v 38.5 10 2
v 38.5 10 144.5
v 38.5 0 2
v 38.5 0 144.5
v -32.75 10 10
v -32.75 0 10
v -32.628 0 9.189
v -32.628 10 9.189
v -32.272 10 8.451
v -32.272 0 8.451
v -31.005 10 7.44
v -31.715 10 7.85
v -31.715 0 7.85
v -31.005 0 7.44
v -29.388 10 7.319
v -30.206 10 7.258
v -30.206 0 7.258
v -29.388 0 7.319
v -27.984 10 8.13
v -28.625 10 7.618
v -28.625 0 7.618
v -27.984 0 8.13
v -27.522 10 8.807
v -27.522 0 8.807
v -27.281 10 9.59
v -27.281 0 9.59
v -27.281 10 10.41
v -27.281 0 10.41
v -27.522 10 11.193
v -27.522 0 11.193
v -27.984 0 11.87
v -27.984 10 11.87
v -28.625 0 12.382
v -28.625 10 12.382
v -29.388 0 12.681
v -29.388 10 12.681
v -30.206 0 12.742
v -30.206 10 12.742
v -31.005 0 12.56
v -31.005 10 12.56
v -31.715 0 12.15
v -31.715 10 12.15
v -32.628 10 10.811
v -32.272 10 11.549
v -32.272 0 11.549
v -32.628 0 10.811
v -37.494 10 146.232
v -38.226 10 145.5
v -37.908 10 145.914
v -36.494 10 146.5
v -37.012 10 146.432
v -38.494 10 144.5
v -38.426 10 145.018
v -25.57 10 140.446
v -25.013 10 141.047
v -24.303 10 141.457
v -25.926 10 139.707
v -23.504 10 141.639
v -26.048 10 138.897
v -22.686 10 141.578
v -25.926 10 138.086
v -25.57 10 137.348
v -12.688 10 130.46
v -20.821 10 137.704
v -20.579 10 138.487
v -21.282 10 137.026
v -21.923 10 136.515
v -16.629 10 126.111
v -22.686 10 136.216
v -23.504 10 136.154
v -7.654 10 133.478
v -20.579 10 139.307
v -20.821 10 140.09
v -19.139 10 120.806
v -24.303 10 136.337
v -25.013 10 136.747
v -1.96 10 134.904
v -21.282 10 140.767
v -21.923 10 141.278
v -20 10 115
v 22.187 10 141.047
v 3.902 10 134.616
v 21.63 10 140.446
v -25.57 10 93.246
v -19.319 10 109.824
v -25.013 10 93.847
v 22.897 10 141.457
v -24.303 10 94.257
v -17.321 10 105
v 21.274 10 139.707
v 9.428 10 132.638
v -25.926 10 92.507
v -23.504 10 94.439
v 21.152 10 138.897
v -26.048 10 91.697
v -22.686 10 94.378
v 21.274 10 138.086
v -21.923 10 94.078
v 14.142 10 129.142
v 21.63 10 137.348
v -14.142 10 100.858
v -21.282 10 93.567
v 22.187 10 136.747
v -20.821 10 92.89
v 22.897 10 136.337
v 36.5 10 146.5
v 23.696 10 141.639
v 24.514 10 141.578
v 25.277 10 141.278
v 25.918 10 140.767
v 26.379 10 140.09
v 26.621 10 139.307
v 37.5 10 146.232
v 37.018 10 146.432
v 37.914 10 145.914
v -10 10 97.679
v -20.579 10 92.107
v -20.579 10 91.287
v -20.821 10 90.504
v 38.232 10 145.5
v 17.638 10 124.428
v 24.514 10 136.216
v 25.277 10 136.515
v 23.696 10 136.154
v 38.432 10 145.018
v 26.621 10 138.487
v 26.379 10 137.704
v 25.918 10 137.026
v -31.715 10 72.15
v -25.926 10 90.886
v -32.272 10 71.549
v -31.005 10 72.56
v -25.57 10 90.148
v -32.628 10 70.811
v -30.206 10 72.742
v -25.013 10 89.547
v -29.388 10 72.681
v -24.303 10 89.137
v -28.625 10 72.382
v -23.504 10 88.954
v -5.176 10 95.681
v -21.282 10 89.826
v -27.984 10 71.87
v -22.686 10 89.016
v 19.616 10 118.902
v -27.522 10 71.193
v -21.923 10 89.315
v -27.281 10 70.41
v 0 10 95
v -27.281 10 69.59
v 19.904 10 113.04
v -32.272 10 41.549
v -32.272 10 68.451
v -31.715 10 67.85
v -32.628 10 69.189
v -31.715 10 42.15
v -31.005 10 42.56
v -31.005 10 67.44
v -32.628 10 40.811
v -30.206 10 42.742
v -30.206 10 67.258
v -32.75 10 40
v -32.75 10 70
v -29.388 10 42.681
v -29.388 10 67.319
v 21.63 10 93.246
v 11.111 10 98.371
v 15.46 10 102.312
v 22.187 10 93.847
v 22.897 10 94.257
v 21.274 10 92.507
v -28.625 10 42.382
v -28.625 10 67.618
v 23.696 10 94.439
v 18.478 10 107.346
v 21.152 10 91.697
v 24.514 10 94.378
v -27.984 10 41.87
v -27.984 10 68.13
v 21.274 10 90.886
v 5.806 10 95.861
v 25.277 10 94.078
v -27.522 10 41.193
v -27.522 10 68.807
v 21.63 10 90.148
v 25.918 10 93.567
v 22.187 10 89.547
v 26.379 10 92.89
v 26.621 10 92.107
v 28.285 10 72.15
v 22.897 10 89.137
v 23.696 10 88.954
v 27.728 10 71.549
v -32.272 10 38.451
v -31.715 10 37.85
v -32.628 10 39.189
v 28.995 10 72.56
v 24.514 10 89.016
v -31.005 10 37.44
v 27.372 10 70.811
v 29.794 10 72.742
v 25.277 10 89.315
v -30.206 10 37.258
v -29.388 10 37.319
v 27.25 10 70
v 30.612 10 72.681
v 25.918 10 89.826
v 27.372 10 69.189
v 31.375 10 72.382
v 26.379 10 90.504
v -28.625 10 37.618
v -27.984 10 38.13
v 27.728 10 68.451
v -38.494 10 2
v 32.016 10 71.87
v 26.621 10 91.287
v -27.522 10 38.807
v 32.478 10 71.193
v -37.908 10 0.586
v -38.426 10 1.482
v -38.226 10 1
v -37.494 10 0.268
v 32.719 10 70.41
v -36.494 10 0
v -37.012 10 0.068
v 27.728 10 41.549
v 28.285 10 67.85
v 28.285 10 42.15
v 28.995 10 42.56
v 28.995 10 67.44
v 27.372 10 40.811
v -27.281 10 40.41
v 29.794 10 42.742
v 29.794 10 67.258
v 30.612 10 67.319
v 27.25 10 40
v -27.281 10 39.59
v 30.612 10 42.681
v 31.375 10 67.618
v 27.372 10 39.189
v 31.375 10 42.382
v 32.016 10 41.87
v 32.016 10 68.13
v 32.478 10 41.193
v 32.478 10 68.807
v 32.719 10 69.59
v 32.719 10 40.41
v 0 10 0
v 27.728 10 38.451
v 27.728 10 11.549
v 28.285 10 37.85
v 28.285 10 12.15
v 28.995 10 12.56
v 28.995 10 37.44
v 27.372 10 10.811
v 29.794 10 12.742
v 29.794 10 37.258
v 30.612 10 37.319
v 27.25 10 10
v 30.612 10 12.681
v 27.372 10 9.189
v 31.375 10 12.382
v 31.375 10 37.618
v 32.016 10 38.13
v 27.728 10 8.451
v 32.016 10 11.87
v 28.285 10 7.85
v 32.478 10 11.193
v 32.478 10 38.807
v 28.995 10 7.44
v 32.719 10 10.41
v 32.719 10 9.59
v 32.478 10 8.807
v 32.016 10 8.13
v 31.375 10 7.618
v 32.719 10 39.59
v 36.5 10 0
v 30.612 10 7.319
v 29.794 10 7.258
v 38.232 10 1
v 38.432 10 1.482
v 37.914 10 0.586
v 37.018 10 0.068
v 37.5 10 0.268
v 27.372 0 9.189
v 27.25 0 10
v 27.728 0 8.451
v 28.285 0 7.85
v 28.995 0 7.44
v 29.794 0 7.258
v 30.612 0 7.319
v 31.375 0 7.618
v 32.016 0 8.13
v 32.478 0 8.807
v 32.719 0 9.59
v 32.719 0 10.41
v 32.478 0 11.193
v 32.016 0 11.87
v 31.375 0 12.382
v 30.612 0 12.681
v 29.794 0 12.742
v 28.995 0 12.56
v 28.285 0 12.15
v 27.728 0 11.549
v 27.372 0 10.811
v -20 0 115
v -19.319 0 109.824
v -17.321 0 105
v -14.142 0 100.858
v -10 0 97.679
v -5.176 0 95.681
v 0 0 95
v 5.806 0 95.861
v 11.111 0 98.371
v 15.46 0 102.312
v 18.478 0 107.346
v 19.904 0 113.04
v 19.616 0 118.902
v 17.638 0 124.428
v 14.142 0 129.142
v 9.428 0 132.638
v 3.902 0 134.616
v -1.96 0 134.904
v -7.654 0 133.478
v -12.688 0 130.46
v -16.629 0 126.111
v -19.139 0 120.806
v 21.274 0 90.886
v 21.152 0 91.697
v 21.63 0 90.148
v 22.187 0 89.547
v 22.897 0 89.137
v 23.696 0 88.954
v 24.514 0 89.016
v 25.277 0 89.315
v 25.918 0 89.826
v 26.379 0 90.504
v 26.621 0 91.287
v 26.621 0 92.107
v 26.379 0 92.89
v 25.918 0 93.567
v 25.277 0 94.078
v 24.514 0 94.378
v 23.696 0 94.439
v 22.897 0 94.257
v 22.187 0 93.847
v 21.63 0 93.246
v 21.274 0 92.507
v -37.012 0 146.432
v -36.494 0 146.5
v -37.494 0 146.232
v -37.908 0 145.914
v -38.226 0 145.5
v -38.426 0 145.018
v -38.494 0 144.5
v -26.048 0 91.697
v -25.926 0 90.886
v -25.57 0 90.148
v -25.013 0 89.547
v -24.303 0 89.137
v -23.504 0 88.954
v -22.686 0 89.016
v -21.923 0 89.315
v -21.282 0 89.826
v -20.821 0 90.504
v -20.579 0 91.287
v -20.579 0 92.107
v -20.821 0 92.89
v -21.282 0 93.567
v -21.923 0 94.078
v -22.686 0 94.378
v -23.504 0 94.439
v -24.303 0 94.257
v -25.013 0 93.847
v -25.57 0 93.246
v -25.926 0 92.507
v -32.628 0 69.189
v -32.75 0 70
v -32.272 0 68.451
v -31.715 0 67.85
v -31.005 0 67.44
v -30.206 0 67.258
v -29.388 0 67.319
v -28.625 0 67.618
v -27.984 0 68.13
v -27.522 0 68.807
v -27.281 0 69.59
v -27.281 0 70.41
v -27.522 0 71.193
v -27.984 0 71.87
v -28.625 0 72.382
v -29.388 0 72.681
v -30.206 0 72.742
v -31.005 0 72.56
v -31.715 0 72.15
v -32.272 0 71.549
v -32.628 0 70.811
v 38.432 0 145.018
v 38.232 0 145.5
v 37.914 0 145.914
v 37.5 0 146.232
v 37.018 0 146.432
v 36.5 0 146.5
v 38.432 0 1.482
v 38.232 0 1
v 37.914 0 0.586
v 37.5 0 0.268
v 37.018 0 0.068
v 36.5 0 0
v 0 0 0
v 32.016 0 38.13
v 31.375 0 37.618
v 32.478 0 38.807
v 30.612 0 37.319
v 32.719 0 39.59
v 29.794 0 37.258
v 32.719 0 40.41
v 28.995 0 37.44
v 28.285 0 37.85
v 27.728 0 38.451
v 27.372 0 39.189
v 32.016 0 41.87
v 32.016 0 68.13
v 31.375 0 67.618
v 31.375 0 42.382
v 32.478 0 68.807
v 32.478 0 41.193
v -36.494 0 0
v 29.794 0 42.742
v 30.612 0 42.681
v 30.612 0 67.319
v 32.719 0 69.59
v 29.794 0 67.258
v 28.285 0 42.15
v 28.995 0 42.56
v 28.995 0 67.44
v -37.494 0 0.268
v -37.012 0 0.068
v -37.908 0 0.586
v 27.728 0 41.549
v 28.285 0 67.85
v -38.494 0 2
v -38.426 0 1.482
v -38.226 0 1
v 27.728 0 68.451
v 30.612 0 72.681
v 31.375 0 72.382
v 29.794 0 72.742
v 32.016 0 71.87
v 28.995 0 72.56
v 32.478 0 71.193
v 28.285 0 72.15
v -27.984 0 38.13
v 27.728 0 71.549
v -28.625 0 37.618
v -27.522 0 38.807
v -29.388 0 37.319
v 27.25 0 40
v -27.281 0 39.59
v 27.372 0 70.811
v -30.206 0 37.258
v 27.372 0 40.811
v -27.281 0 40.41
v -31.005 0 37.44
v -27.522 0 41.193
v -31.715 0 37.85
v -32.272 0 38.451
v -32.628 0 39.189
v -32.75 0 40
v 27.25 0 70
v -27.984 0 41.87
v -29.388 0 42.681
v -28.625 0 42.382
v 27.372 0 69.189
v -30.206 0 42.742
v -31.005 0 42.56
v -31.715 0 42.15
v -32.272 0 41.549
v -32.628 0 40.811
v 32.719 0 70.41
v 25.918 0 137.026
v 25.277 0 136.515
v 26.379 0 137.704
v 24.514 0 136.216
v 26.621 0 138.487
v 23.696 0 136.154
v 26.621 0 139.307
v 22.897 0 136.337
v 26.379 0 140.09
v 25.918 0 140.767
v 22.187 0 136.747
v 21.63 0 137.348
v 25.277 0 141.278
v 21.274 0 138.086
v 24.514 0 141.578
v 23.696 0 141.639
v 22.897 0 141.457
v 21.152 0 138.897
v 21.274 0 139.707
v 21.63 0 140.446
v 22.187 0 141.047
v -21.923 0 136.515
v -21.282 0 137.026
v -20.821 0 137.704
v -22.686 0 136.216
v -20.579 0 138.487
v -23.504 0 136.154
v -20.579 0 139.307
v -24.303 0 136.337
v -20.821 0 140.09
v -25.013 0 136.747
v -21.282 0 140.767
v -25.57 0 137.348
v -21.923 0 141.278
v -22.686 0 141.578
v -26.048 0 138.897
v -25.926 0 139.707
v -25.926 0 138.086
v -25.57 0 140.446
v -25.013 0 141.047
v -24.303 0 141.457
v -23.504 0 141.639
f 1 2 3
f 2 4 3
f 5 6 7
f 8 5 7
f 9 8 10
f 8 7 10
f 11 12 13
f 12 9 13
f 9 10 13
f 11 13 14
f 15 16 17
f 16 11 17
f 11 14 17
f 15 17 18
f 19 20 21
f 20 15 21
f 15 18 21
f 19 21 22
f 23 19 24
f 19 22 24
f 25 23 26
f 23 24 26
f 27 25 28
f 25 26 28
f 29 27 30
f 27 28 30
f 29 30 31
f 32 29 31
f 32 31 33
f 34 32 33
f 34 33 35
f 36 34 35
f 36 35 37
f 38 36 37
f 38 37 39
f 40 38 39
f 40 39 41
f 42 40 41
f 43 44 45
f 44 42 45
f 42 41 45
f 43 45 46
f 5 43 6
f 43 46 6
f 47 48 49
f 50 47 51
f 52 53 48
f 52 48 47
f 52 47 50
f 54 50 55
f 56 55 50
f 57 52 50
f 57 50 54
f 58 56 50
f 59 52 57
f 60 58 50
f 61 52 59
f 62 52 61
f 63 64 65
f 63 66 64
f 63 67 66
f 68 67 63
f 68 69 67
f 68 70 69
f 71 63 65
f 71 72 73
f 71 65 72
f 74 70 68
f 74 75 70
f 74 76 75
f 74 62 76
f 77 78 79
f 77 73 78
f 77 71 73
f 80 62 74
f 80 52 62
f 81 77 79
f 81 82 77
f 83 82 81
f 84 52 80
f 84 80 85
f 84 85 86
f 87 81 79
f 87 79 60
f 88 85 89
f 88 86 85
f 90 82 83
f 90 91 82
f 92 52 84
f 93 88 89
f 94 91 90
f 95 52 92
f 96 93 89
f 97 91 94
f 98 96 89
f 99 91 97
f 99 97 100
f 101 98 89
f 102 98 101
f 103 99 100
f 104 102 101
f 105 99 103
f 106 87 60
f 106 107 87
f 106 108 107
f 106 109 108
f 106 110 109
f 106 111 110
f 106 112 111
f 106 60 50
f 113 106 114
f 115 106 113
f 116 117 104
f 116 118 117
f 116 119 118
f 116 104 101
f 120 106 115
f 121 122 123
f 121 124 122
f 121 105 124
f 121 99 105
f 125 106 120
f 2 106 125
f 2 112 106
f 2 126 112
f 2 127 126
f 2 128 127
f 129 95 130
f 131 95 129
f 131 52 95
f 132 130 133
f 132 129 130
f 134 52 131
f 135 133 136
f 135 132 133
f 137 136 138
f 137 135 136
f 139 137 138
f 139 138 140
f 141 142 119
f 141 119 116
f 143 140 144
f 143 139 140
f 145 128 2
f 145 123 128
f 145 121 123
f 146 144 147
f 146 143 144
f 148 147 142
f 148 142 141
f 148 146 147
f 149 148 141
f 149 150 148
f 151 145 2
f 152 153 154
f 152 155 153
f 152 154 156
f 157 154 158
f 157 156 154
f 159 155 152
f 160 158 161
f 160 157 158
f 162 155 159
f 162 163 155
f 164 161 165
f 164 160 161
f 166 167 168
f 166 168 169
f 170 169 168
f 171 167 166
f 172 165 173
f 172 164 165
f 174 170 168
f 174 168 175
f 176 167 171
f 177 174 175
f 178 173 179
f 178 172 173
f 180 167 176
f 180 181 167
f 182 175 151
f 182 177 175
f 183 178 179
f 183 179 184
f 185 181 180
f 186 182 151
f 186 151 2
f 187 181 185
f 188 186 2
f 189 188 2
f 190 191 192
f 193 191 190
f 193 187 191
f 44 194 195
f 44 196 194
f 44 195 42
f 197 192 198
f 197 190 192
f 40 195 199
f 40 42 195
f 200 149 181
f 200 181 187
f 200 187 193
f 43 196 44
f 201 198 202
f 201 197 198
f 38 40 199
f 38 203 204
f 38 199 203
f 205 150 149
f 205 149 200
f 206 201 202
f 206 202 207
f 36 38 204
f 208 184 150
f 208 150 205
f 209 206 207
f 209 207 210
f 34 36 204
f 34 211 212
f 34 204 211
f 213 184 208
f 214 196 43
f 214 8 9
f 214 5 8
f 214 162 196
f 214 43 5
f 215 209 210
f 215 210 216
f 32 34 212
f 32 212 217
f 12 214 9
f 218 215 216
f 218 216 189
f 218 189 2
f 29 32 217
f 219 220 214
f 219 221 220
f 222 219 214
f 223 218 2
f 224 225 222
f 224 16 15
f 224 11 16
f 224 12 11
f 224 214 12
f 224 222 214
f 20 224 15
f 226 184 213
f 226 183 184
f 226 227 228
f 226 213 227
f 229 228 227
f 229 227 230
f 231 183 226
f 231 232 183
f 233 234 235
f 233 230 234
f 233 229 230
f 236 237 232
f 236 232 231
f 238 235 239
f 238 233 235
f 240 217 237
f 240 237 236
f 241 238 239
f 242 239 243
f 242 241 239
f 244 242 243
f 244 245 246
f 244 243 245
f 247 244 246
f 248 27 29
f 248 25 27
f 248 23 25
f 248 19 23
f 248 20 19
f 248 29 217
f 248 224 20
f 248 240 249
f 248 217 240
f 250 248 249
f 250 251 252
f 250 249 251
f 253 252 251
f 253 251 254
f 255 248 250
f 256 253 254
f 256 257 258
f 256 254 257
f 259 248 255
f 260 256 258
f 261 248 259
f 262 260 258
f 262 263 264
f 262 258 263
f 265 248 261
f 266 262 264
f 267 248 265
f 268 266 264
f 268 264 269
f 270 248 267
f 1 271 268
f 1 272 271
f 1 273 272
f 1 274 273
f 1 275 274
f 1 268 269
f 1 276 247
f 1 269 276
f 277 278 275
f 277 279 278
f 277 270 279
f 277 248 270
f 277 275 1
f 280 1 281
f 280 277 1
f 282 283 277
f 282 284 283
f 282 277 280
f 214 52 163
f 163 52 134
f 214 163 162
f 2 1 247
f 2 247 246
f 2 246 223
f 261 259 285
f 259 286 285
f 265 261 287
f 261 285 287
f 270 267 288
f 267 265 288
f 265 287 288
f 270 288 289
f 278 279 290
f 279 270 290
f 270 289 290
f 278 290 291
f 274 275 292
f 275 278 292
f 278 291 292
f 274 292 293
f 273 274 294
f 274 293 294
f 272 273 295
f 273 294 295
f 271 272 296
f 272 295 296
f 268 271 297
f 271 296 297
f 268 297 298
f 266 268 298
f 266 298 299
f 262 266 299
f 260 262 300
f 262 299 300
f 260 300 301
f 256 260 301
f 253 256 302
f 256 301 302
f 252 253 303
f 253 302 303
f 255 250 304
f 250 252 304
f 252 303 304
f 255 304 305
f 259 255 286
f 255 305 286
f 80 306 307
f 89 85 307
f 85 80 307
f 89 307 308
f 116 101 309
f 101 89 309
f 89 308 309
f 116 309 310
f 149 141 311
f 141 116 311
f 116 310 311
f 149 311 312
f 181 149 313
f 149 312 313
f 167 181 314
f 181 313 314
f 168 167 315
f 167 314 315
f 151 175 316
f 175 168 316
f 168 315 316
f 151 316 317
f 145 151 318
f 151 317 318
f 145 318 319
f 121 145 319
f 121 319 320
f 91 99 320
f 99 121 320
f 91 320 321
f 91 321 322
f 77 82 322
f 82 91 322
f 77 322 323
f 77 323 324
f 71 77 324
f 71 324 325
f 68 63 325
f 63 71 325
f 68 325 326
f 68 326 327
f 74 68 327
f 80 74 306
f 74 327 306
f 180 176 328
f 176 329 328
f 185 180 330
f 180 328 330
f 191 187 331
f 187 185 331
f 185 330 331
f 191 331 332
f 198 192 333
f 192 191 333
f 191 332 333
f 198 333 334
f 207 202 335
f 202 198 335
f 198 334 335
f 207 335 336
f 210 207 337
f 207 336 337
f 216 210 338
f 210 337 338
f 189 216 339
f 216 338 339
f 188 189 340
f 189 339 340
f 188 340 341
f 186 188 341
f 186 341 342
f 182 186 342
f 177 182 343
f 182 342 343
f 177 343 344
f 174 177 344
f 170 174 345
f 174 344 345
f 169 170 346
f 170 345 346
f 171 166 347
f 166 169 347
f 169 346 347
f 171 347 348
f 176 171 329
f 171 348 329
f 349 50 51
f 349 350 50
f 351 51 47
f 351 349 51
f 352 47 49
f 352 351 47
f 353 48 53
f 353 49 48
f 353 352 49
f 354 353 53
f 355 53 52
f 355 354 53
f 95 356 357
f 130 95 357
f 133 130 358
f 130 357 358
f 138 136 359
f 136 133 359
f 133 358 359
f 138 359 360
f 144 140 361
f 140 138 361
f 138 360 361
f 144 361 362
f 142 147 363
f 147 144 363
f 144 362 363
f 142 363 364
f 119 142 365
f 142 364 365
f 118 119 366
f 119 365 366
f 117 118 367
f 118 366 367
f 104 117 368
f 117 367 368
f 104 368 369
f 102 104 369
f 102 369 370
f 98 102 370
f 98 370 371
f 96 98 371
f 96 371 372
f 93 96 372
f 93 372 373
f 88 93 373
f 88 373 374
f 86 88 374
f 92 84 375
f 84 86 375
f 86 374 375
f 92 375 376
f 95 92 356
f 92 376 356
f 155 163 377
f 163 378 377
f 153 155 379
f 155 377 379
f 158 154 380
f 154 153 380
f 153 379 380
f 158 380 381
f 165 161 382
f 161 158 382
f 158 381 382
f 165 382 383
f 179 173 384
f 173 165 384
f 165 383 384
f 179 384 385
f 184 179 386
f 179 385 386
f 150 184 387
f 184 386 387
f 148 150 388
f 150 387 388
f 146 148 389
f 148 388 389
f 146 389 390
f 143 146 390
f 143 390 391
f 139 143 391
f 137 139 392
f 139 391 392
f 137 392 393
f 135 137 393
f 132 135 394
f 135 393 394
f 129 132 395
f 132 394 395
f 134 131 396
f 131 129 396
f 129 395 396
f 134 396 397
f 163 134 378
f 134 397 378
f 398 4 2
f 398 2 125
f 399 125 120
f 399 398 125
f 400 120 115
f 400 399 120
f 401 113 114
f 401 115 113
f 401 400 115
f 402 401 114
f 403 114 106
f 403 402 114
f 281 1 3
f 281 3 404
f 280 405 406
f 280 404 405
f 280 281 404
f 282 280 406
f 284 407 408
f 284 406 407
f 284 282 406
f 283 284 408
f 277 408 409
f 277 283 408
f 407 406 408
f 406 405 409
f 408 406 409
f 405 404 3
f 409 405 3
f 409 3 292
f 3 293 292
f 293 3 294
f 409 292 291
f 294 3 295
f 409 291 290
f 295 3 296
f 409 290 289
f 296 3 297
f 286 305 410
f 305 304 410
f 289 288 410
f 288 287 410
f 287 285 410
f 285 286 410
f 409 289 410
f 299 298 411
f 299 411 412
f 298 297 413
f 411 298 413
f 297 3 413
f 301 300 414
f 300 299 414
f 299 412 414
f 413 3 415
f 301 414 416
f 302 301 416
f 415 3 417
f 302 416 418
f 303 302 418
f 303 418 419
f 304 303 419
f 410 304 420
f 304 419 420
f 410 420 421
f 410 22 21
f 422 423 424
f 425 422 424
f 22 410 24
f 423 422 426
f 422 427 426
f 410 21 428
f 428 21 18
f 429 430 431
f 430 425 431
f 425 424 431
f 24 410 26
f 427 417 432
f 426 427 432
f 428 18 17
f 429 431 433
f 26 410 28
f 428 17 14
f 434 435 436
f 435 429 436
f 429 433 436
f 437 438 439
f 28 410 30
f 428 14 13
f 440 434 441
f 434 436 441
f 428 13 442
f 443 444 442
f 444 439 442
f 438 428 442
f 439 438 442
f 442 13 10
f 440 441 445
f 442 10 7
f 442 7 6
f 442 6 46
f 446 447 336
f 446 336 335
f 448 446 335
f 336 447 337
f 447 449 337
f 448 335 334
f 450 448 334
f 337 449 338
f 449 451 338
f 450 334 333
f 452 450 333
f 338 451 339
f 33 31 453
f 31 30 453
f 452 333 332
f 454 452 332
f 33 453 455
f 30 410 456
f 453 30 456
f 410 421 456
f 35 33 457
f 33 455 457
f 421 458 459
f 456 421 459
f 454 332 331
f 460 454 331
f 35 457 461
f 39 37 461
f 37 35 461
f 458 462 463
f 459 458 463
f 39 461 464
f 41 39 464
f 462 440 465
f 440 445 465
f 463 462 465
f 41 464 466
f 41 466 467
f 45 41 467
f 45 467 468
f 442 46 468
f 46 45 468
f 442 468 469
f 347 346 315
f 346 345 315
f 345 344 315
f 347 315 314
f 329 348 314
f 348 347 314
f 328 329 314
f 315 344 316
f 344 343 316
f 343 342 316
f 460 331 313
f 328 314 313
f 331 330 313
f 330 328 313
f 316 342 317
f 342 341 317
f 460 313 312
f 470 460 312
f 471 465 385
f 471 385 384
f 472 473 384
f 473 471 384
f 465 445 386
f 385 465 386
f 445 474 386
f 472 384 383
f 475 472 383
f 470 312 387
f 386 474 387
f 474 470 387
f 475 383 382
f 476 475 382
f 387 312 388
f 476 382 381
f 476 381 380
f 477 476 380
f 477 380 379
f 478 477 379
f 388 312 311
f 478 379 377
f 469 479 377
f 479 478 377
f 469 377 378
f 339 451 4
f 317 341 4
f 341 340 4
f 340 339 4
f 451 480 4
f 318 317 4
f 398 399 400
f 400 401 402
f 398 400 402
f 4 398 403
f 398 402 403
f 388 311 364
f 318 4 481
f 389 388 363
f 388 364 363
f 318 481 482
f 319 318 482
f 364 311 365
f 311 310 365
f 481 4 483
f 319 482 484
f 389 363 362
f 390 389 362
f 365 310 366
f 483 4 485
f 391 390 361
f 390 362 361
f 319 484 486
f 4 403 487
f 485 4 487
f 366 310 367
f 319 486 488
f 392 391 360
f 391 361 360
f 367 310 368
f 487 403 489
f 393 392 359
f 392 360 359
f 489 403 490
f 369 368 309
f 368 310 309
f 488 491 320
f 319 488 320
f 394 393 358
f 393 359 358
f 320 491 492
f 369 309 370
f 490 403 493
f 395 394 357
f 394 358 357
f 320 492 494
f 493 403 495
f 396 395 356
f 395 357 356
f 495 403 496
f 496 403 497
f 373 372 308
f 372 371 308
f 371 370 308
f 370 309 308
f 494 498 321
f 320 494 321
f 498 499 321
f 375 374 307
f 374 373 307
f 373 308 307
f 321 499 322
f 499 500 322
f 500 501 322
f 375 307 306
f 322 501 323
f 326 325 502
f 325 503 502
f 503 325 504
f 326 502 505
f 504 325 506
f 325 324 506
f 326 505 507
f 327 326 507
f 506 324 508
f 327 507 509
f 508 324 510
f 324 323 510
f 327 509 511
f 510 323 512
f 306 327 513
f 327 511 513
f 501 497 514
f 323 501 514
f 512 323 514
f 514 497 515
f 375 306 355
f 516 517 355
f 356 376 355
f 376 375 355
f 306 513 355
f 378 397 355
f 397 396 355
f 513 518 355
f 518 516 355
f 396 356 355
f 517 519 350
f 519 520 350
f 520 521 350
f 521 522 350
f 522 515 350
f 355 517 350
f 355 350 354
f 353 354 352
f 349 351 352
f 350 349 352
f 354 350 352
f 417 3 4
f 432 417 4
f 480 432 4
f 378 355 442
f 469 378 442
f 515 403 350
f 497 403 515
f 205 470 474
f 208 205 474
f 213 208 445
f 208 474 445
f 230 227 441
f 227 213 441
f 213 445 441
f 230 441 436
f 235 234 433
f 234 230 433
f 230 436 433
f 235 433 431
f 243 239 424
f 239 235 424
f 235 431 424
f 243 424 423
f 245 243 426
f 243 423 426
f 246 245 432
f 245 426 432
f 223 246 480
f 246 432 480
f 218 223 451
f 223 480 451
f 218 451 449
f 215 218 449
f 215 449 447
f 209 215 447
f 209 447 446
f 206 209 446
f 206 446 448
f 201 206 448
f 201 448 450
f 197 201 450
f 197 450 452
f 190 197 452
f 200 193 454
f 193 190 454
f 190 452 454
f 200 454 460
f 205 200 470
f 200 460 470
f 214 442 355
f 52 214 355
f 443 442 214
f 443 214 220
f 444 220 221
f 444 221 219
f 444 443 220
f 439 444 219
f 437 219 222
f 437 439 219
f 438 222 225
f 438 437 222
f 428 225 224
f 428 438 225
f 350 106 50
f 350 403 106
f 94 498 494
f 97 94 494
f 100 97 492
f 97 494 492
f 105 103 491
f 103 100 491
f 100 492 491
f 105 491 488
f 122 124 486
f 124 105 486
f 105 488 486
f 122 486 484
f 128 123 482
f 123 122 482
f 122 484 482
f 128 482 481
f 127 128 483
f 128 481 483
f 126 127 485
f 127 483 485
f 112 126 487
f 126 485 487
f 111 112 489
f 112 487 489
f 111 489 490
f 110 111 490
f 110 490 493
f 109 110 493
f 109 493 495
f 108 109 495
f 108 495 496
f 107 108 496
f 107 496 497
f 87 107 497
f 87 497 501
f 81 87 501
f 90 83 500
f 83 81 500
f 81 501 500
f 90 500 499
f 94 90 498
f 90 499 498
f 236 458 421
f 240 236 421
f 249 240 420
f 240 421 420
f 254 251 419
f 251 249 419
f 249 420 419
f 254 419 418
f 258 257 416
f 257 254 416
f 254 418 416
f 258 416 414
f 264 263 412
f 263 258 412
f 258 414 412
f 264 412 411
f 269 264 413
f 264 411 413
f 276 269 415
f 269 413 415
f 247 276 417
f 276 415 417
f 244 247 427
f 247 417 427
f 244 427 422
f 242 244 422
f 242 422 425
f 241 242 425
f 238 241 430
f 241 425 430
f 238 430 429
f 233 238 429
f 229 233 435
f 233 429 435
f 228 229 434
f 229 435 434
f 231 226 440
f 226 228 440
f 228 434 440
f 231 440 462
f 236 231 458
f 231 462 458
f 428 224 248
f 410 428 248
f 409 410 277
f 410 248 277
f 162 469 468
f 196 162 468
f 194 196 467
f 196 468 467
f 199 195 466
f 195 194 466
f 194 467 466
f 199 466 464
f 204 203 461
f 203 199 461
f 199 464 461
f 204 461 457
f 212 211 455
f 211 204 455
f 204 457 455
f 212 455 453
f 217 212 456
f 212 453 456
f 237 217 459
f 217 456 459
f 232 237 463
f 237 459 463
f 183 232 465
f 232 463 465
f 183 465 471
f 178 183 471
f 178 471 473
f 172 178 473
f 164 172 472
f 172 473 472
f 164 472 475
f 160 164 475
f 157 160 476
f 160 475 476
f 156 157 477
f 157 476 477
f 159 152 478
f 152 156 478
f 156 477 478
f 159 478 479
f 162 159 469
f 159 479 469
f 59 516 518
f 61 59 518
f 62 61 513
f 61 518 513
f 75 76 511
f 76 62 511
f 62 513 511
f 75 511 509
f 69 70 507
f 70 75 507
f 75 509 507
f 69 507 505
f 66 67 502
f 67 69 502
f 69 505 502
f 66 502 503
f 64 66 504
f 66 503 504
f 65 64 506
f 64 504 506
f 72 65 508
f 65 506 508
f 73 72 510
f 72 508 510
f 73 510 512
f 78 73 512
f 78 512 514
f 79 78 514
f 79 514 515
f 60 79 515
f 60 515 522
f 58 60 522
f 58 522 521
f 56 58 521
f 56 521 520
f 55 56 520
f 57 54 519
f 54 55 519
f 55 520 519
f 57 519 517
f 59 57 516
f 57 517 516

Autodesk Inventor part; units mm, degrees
ref_plane "YZ Plane" through (0, 0, 0) normal (1, 0, 0) x (0, 1, 0)
ref_plane "XZ Plane" through (0, 0, 0) normal (0, 1, 0) x (-1, 0, 0)
ref_plane "XY Plane" through (0, 0, 0) normal (0, 0, 1) x (1, 0, 0)
sketch "Sketch1" plane through (0, 0, 0) normal (0, 1, 0) x (-1, 0, 0)
  arc A0 (-15, 27) -> (-13, 25) centre (-13, 27) ccw
  line L0 (-15, 27) -> (-15, 53)
  arc A1 (-13, 55) -> (-15, 53) centre (-13, 53) ccw
  line L1 (-13, 55) -> (13, 55)
  arc A2 (15, 53) -> (13, 55) centre (13, 53) ccw
  line L2 (15, 53) -> (15, 27)
  arc A3 (13, 25) -> (15, 27) centre (13, 27) ccw
  line L3 (13, 25) -> (-13, 25)
  arc A4 (36.5, 1.5) -> (38.5, 3.5) centre (36.5, 3.5) ccw
  line L4 (38.5, 3.5) -> (38.5, 76.5)
  arc A5 (38.5, 76.5) -> (36.5, 78.5) centre (36.5, 76.5) ccw
  line L5 (36.5, 78.5) -> (-36.5, 78.5)
  arc A6 (-36.5, 78.5) -> (-38.5, 76.5) centre (-36.5, 76.5) ccw
  line L6 (-38.5, 76.5) -> (-38.5, 3.5)
  arc A7 (-38.5, 3.5) -> (-36.5, 1.5) centre (-36.5, 3.5) ccw
  line L7 (-36.5, 1.5) -> (36.5, 1.5)
  circle A8 centre (0, 60) radius 2.5
  circle A9 centre (-10, 70) radius 2.5
  circle A10 centre (10, 70) radius 2.5
  circle A11 centre (30, 70) radius 2.75
  circle A12 centre (10, 10) radius 2.5
  circle A13 centre (30, 10) radius 2.75
  circle A14 centre (0, 20) radius 2.5
  circle A15 centre (20, 30) radius 2.5
  circle A16 centre (20, 60) radius 2.5
  circle A17 centre (20, 50) radius 2.5
  circle A18 centre (-20, 30) radius 2.5
  circle A19 centre (-30, 40) radius 2.75
  circle A20 centre (-20, 20) radius 2.5
  circle A21 centre (20, 20) radius 2.5
  circle A22 centre (-20, 60) radius 2.5
  circle A23 centre (-10, 10) radius 2.5
  circle A24 centre (-30, 10) radius 2.75
  circle A25 centre (-30, 70) radius 2.75
  circle A26 centre (30, 40) radius 2.75
  circle A27 centre (-20, 50) radius 2.5
  line L8 (13, 53) -> (-13, 27)
  line L9 (-13, 53) -> (13, 27)
  line L10 (0, 0) -> (0, 40)
  line L11 (0, 0) -> (0, -40)
  line L12 (36.4941, 78.5) -> (-36.5, 78.5)
  line L13 (-38.5, 78.5) -> (-38.5, -56.3967)
  line L14 (-36.5, -66.5) -> (36.4941, -66.5)
  line L15 (38.4941, -59.5) -> (38.4941, 76.5)
  arc A28 (38.4941, 76.5) -> (36.4941, 78.5) centre (36.4941, 76.5) ccw
  arc A29 (-36.5, 78.5) -> (-38.5, 76.5) centre (-36.5, 76.5) ccw
  arc A30 (-38.5, -56.3967) -> (-36.5, -58.3967) centre (-36.5, -56.3967) ccw
  arc A31 (36.4941, -66.5) -> (38.4941, -64.5) centre (36.4941, -64.5) ccw
  line L16 (-38.5, -59.5) -> (-38.5, -56.3967)
  arc A32 (-38.5, -64.5) -> (-36.5, -66.5) centre (-36.5, -64.5) ccw
  circle A33 centre (0, -35) radius 20
  arc A34 (-25.4017, -7.1967) -> (-28.4017, -10.1967) centre (-25.4017, -10.1967) ccw
  line L17 (-28.4017, -10.1967) -> (-28.4017, -61.3967)
  arc A35 (-28.4017, -61.3967) -> (-26.4017, -63.3967) centre (-26.4017, -61.3967) ccw
  line L18 (-26.4017, -63.3967) -> (24.7983, -63.3967)
  arc A36 (24.7983, -63.3967) -> (27.7983, -60.3967) centre (24.7983, -60.3967) ccw
  line L19 (27.7983, -60.3967) -> (27.7983, -10.1967)
  arc A37 (27.7983, -10.1967) -> (24.7983, -7.1967) centre (24.7983, -10.1967) ccw
  line L20 (24.7983, -7.1967) -> (-25.4017, -7.1967)
  circle A38 centre (23.2983, -11.6967) radius 2.75
  circle A39 centre (-23.9017, -11.6967) radius 2.75
  circle A40 centre (23.2983, -58.8967) radius 2.75
  circle A41 centre (-23.9017, -58.8967) radius 2.75
  line L21 (38.4941, -59.5) -> (38.4941, -64.5)
  line L22 (-38.5, -64.5) -> (-38.5, -59.5)
  line L23 (-10, 40) -> (11.2302, 40)
  line L24 (0, 80) -> (0, 40)
  line L25 (0, 80) -> (0, 120)
  line L26 (-38.5, 1.5) -> (-38.5, 136.3967)
  line L27 (-36.5, 146.5) -> (36.4941, 146.5)
  line L28 (38.4941, 139.5) -> (38.4941, 3.5)
  arc A42 (-36.5, 138.3967) -> (-38.5, 136.3967) centre (-36.5, 136.3967) ccw
  arc A43 (38.4941, 144.5) -> (36.4941, 146.5) centre (36.4941, 144.5) ccw
  line L29 (-38.5, 139.5) -> (-38.5, 136.3967)
  arc A44 (-36.5, 146.5) -> (-38.5, 144.5) centre (-36.5, 144.5) ccw
  circle A45 centre (0, 115) radius 20
  arc A46 (-28.4017, 90.1967) -> (-25.4017, 87.1967) centre (-25.4017, 90.1967) ccw
  line L30 (-28.4017, 90.1967) -> (-28.4017, 141.3967)
  arc A47 (-26.4017, 143.3967) -> (-28.4017, 141.3967) centre (-26.4017, 141.3967) ccw
  line L31 (-26.4017, 143.3967) -> (24.7983, 143.3967)
  arc A48 (27.7983, 140.3967) -> (24.7983, 143.3967) centre (24.7983, 140.3967) ccw
  line L32 (27.7983, 140.3967) -> (27.7983, 90.1967)
  arc A49 (24.7983, 87.1967) -> (27.7983, 90.1967) centre (24.7983, 90.1967) ccw
  line L33 (24.7983, 87.1967) -> (-25.4017, 87.1967)
  circle A50 centre (23.2983, 91.6967) radius 2.75
  circle A51 centre (-23.9017, 91.6967) radius 2.75
  circle A52 centre (23.2983, 138.8967) radius 2.75
  circle A53 centre (-23.9017, 138.8967) radius 2.75
  line L34 (38.4941, 139.5) -> (38.4941, 144.5)
  line L35 (-38.5, 144.5) -> (-38.5, 139.5)
  point P0 (-38.5, 1.5)
  point P1 (0, 40)
  point P2 (-38.5, -61.5)
  point P3 (36.4941, 78.5)
  point P4 (38.4941, 3.3463)
  point P5 (36.5, 78.5)
  point P6 (0, 1.5)
  point P7 (36.4941, 78.5)
  point P8 (36.4941, -66.5)
  point P9 (-38.5, 141.5)
  point P10 (38.4941, 76.6537)
  point P11 (36.4941, 146.5)
  dimension "d0" = 40
  dimension "d1" = 40
  dimension "d2" = 2
  dimension "d5" = 145
  dimension "d6" = 0
  dimension "d7" = 2
  dimension "d13" = 5.5
  dimension "d14" = 5.5
  dimension "d15" = 5.5
  dimension "d16" = 5.5
  dimension "d17" = 5.5
  dimension "d18" = 5.5
  dimension "d20" = 40
  dimension "d21" = 5.5
  dimension "d22" = 5.5
  dimension "d23" = 5.5
  dimension "d24" = 5.5
extrude "Extrusion1" add sketch "Sketch1" along normal blind 10 contours A0 L3 L10 A14 L7 A7 L6 A6 L5 L24 A8 L1 A1 L0 | L3 A3 L2 A2 L1 L24 A8 L5 A28 L15 A4 L7 L10 A14 | L10 A14 | A14 L10 | L24 A8 | A8 L24 | L7 A4 L15 L21 A31 L14 A32 L22 L16 L13 A7 | L20 A37 L19 A36 L18 A35 L17 A34 | L5 A6 L13 L26 L29 L35 A44 L27 A43 L34 L28 A5 | L33 A46 L30 A47 L31 A48 L32 A49 | A9 | A10 | A12 | A15 | A16 | A17 | A18 | A20 | A21 | A22 | A23 | A27
sketch "Sketch3" plane through (0, 10, 0) normal (0, 1, 0) x (1, 0, 0)
  line L0 (15, -27) -> (15, -53) projected
  arc A0 (15, -27) -> (13, -25) centre (13, -27) ccw projected
  line L1 (-13, -25) -> (13, -25) projected
  arc A1 (-13, -25) -> (-15, -27) centre (-13, -27) ccw projected
  line L2 (-15, -53) -> (-15, -27) projected
  line L3 (13, -55) -> (-13, -55) projected
  arc A2 (13, -55) -> (15, -53) centre (13, -53) ccw projected
  arc A3 (-15, -53) -> (-13, -55) centre (-13, -53) ccw projected
  point P0 (0, 0)
extrude "Extrusion2" add sketch "Sketch3" against normal blind 10
sketch "Sketch5" plane through (0, 10, 0) normal (0, 1, 0) x (1, 0, 0)
  circle A0 centre (-23.2983, 11.6967) radius 2.75
  line L0 (8.6601, 21.3463) -> (-11.3399, 21.3463)
  line L1 (8.6601, 51.3463) -> (8.6601, 21.3463)
  line L2 (8.6601, 21.3463) -> (-11.3399, 21.3463)
  arc A1 (-21.3399, 31.3463) -> (-11.3399, 21.3463) centre (-11.3399, 31.3463) ccw
  line L3 (-21.3399, 31.3463) -> (-21.3399, 41.3463)
  arc A2 (-11.3399, 51.3463) -> (-21.3399, 41.3463) centre (-11.3399, 41.3463) ccw
  line L4 (-11.3399, 51.3463) -> (8.6601, 51.3463)
  circle A3 centre (23.9017, 11.6967) radius 2.75
  circle A4 centre (23.9017, 58.8967) radius 2.75
  circle A5 centre (-23.2983, 11.6967) radius 2.75
  circle A6 centre (-23.2983, 58.8967) radius 2.75
  line L5 (37.0974, 65.5992) -> (-35.8967, 65.5992)
  arc A7 (-35.8967, 65.5992) -> (-37.8967, 63.5992) centre (-35.8967, 63.5992) ccw
  line L6 (-37.8967, 63.5992) -> (-37.8967, 6.0933)
  line L7 (-37.8967, 6.0933) -> (-37.8967, 3.0933)
  line L8 (39.0974, 3.0933) -> (-37.8967, 3.0933)
  line L9 (39.0974, 63.5992) -> (39.0974, 3.0933)
  arc A8 (39.0974, 63.5992) -> (37.0974, 65.5992) centre (37.0974, 63.5992) ccw
  circle A9 centre (-23.2983, 11.6967) radius 2.75 projected
  point P0 (0, 0)
  point P1 (0.6033, 35.5933)
  point P2 (-11.3399, 21.3463)
sketch "Sketch6" plane through (0, 10, 0) normal (0, 1, 0) x (1, 0, 0)
  circle A0 centre (0, 35) radius 20 projected
  point P0 (0, 0)
extrude "Extrusion3" add sketch "Sketch6" against normal up to surface (10 mm away)
extrude "Extrusion4" cut sketch "Sketch5" against normal blind 10 contours L0 A1 L3 A2 L4 L1
sketch "Sketch7" plane through (-38.4941, 0, 76.6537) normal (-1, 0, 0) x (0, 0, 1)
  line L0 (67.8463, 10) -> (-141.1537, 10) projected
  line L1 (67.8463, 0) -> (-141.1537, 0) projected
  line L2 (2.4973, 10) -> (-2.5509, 10)
  line L3 (-2.5509, 10) -> (-2.5509, 0)
  line L4 (-2.5509, 0) -> (2.4973, 0)
  line L5 (2.4973, 0) -> (2.4973, 10)
  point P0 (-76.6537, 0)
extrude "Extrusion5" add sketch "Sketch7" against normal blind 4
sketch "Sketch8" plane through (0, 10, 0) normal (0, 1, 0) x (1, 0, 0)
  line L0 (-38.4941, 64.5) -> (-38.4941, -144.5) projected
  line L1 (-38.4941, 0) -> (43.0425, 0)
  line L2 (43.0425, 0) -> (43.0425, 71.8354)
  line L3 (43.0425, 71.8354) -> (-38.4941, 71.8354)
  line L4 (-38.4941, 71.8354) -> (-38.4941, 0)
  point P0 (0, 0)
extrude "Extrusion6" cut sketch "Sketch8" against normal through all
fillet "Fillet1" radius 2 2 edges at (38.5, 5, 0) (-38.4941, 5, 0)
properties part number "afirma_motor_lado"
